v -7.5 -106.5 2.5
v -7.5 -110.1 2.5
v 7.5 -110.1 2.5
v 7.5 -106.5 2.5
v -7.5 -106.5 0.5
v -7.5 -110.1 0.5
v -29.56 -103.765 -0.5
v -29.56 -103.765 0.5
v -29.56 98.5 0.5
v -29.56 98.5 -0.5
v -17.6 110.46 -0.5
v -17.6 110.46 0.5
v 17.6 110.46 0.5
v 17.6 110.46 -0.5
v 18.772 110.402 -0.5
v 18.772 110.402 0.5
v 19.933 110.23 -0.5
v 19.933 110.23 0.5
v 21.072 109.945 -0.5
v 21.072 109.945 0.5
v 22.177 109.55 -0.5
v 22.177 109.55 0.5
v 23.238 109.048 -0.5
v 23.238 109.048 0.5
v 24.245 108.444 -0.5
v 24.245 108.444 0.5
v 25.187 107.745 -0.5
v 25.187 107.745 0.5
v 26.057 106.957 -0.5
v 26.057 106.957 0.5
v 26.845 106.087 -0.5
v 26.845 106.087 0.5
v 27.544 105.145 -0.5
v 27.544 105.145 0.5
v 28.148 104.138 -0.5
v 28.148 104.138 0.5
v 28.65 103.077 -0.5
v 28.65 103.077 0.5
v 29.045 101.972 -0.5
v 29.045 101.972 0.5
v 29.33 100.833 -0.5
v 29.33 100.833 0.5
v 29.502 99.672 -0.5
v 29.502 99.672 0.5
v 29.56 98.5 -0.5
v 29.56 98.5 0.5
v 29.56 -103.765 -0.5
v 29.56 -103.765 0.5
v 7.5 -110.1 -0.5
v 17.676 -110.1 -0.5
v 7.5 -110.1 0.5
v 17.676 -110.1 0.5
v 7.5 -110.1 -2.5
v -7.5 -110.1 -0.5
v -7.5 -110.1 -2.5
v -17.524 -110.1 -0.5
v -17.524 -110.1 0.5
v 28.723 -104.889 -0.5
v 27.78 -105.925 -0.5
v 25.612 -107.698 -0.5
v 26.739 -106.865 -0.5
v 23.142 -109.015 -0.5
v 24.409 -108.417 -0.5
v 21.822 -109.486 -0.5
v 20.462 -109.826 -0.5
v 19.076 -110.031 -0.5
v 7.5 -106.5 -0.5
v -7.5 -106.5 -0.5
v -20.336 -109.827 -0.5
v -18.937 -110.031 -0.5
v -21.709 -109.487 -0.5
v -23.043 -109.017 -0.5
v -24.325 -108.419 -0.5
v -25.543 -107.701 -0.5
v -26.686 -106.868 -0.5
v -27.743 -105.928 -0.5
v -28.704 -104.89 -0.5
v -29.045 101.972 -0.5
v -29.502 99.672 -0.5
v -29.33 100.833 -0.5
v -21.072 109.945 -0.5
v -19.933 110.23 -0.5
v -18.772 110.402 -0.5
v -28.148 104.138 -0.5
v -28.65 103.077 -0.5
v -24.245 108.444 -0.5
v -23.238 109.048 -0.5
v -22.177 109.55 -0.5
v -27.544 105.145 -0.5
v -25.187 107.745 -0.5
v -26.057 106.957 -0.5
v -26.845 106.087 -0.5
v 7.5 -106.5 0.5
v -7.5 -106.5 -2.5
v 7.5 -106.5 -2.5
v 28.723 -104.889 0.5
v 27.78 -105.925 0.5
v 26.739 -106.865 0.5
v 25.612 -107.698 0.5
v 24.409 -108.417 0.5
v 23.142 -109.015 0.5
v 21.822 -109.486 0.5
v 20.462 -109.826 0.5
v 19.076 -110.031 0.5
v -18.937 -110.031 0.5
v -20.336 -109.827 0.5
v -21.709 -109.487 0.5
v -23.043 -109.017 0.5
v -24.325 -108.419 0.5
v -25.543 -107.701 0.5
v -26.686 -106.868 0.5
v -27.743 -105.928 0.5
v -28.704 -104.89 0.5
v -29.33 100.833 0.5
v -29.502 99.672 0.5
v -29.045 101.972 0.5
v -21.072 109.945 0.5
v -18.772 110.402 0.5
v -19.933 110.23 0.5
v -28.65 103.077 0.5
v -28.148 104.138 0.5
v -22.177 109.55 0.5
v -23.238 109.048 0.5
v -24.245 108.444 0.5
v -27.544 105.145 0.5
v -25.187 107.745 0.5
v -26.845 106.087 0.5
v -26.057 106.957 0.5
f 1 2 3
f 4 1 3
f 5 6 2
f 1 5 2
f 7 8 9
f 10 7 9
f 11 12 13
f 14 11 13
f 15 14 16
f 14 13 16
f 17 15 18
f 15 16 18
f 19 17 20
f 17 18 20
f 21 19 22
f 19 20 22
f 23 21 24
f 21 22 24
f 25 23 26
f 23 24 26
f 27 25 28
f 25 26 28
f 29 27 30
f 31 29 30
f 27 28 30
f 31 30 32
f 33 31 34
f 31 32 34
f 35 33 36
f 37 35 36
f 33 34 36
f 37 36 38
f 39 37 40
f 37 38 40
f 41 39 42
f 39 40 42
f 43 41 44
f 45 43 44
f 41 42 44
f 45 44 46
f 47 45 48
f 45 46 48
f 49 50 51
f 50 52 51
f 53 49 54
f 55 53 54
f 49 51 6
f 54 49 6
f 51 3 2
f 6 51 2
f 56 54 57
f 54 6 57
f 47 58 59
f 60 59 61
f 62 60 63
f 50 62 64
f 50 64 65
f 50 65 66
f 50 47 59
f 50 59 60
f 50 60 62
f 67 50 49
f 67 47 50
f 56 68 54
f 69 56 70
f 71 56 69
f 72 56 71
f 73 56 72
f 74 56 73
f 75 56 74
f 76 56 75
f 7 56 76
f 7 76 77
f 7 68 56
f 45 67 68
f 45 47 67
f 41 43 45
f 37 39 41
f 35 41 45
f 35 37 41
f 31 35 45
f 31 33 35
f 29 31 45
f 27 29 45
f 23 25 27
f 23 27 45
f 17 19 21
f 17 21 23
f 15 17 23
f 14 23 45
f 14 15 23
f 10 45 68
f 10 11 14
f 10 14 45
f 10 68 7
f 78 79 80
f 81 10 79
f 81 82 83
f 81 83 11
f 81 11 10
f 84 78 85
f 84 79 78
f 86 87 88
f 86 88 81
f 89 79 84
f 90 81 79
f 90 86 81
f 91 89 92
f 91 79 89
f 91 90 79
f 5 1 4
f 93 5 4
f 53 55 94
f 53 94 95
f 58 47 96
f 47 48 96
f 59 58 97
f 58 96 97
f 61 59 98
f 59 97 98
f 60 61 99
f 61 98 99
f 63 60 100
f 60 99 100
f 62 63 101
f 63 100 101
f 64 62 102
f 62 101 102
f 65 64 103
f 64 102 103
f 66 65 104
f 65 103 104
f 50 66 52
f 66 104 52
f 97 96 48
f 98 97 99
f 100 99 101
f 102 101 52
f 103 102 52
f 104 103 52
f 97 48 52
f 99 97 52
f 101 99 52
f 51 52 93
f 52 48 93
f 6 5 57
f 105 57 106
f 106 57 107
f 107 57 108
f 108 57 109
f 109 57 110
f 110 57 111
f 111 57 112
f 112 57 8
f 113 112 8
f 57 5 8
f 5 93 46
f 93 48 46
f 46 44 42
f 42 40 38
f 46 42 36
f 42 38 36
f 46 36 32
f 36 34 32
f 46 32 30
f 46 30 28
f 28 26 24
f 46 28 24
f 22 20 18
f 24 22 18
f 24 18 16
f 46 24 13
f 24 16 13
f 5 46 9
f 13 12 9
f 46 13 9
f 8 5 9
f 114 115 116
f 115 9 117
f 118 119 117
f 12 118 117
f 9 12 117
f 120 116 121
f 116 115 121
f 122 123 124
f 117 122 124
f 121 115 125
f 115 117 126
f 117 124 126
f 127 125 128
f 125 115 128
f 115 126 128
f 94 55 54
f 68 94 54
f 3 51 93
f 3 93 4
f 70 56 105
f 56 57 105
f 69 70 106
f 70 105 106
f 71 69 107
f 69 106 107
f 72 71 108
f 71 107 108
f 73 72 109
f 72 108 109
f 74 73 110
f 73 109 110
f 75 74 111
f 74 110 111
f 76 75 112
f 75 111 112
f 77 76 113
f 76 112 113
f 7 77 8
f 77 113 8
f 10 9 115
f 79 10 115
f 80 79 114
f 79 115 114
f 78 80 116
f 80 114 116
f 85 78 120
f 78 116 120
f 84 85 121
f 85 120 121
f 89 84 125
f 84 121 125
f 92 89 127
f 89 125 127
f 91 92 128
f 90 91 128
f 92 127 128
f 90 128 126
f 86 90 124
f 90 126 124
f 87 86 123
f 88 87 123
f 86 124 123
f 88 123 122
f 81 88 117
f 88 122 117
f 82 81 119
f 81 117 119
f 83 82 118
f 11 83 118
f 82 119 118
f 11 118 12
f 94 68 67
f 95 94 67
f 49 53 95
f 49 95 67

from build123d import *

# Parameters (mm, degrees)
EXTRUDE_1_DEPTH = 0.5
SKETCH_2_W      = 15
SKETCH_2_H      = 2
EXTRUDE_2_DEPTH = 3.6


with BuildPart() as part:
    # 草圖1 → 填料-伸長1 (new body, symmetric)
    with BuildSketch(Plane.XY):
        with BuildLine():
            Line((-17.6, 110.46), (17.6, 110.46))
            ThreePointArc((17.6, 110.46), (26.056997103, 106.956997103), (29.56, 98.5))
            Line((29.56, 98.5), (29.56, -103.764581662))
            ThreePointArc((29.56, -103.764581662), (24.409428177, -108.417234577), (17.675642482, -110.1))
            Line((17.675642482, -110.1), (-17.524357518, -110.1))
            ThreePointArc((-17.524357518, -110.1), (-24.32498645, -108.419421277), (-29.56, -103.764581662))
            Line((-29.56, -103.764581662), (-29.56, 98.5))
            ThreePointArc((-29.56, 98.5), (-26.056997103, 106.956997103), (-17.6, 110.46))
        make_face()
    extrude(amount=EXTRUDE_1_DEPTH, both=True)

    # 草圖2 → 填料-伸長2 (add)
    with BuildSketch(Plane.XZ.offset(110.1)):
        with Locations((0, -1.5)):
            Rectangle(SKETCH_2_W, SKETCH_2_H)
        with Locations((0, 1.5)):
            Rectangle(SKETCH_2_W, SKETCH_2_H)
    extrude(amount=-EXTRUDE_2_DEPTH)


solid = part.part
